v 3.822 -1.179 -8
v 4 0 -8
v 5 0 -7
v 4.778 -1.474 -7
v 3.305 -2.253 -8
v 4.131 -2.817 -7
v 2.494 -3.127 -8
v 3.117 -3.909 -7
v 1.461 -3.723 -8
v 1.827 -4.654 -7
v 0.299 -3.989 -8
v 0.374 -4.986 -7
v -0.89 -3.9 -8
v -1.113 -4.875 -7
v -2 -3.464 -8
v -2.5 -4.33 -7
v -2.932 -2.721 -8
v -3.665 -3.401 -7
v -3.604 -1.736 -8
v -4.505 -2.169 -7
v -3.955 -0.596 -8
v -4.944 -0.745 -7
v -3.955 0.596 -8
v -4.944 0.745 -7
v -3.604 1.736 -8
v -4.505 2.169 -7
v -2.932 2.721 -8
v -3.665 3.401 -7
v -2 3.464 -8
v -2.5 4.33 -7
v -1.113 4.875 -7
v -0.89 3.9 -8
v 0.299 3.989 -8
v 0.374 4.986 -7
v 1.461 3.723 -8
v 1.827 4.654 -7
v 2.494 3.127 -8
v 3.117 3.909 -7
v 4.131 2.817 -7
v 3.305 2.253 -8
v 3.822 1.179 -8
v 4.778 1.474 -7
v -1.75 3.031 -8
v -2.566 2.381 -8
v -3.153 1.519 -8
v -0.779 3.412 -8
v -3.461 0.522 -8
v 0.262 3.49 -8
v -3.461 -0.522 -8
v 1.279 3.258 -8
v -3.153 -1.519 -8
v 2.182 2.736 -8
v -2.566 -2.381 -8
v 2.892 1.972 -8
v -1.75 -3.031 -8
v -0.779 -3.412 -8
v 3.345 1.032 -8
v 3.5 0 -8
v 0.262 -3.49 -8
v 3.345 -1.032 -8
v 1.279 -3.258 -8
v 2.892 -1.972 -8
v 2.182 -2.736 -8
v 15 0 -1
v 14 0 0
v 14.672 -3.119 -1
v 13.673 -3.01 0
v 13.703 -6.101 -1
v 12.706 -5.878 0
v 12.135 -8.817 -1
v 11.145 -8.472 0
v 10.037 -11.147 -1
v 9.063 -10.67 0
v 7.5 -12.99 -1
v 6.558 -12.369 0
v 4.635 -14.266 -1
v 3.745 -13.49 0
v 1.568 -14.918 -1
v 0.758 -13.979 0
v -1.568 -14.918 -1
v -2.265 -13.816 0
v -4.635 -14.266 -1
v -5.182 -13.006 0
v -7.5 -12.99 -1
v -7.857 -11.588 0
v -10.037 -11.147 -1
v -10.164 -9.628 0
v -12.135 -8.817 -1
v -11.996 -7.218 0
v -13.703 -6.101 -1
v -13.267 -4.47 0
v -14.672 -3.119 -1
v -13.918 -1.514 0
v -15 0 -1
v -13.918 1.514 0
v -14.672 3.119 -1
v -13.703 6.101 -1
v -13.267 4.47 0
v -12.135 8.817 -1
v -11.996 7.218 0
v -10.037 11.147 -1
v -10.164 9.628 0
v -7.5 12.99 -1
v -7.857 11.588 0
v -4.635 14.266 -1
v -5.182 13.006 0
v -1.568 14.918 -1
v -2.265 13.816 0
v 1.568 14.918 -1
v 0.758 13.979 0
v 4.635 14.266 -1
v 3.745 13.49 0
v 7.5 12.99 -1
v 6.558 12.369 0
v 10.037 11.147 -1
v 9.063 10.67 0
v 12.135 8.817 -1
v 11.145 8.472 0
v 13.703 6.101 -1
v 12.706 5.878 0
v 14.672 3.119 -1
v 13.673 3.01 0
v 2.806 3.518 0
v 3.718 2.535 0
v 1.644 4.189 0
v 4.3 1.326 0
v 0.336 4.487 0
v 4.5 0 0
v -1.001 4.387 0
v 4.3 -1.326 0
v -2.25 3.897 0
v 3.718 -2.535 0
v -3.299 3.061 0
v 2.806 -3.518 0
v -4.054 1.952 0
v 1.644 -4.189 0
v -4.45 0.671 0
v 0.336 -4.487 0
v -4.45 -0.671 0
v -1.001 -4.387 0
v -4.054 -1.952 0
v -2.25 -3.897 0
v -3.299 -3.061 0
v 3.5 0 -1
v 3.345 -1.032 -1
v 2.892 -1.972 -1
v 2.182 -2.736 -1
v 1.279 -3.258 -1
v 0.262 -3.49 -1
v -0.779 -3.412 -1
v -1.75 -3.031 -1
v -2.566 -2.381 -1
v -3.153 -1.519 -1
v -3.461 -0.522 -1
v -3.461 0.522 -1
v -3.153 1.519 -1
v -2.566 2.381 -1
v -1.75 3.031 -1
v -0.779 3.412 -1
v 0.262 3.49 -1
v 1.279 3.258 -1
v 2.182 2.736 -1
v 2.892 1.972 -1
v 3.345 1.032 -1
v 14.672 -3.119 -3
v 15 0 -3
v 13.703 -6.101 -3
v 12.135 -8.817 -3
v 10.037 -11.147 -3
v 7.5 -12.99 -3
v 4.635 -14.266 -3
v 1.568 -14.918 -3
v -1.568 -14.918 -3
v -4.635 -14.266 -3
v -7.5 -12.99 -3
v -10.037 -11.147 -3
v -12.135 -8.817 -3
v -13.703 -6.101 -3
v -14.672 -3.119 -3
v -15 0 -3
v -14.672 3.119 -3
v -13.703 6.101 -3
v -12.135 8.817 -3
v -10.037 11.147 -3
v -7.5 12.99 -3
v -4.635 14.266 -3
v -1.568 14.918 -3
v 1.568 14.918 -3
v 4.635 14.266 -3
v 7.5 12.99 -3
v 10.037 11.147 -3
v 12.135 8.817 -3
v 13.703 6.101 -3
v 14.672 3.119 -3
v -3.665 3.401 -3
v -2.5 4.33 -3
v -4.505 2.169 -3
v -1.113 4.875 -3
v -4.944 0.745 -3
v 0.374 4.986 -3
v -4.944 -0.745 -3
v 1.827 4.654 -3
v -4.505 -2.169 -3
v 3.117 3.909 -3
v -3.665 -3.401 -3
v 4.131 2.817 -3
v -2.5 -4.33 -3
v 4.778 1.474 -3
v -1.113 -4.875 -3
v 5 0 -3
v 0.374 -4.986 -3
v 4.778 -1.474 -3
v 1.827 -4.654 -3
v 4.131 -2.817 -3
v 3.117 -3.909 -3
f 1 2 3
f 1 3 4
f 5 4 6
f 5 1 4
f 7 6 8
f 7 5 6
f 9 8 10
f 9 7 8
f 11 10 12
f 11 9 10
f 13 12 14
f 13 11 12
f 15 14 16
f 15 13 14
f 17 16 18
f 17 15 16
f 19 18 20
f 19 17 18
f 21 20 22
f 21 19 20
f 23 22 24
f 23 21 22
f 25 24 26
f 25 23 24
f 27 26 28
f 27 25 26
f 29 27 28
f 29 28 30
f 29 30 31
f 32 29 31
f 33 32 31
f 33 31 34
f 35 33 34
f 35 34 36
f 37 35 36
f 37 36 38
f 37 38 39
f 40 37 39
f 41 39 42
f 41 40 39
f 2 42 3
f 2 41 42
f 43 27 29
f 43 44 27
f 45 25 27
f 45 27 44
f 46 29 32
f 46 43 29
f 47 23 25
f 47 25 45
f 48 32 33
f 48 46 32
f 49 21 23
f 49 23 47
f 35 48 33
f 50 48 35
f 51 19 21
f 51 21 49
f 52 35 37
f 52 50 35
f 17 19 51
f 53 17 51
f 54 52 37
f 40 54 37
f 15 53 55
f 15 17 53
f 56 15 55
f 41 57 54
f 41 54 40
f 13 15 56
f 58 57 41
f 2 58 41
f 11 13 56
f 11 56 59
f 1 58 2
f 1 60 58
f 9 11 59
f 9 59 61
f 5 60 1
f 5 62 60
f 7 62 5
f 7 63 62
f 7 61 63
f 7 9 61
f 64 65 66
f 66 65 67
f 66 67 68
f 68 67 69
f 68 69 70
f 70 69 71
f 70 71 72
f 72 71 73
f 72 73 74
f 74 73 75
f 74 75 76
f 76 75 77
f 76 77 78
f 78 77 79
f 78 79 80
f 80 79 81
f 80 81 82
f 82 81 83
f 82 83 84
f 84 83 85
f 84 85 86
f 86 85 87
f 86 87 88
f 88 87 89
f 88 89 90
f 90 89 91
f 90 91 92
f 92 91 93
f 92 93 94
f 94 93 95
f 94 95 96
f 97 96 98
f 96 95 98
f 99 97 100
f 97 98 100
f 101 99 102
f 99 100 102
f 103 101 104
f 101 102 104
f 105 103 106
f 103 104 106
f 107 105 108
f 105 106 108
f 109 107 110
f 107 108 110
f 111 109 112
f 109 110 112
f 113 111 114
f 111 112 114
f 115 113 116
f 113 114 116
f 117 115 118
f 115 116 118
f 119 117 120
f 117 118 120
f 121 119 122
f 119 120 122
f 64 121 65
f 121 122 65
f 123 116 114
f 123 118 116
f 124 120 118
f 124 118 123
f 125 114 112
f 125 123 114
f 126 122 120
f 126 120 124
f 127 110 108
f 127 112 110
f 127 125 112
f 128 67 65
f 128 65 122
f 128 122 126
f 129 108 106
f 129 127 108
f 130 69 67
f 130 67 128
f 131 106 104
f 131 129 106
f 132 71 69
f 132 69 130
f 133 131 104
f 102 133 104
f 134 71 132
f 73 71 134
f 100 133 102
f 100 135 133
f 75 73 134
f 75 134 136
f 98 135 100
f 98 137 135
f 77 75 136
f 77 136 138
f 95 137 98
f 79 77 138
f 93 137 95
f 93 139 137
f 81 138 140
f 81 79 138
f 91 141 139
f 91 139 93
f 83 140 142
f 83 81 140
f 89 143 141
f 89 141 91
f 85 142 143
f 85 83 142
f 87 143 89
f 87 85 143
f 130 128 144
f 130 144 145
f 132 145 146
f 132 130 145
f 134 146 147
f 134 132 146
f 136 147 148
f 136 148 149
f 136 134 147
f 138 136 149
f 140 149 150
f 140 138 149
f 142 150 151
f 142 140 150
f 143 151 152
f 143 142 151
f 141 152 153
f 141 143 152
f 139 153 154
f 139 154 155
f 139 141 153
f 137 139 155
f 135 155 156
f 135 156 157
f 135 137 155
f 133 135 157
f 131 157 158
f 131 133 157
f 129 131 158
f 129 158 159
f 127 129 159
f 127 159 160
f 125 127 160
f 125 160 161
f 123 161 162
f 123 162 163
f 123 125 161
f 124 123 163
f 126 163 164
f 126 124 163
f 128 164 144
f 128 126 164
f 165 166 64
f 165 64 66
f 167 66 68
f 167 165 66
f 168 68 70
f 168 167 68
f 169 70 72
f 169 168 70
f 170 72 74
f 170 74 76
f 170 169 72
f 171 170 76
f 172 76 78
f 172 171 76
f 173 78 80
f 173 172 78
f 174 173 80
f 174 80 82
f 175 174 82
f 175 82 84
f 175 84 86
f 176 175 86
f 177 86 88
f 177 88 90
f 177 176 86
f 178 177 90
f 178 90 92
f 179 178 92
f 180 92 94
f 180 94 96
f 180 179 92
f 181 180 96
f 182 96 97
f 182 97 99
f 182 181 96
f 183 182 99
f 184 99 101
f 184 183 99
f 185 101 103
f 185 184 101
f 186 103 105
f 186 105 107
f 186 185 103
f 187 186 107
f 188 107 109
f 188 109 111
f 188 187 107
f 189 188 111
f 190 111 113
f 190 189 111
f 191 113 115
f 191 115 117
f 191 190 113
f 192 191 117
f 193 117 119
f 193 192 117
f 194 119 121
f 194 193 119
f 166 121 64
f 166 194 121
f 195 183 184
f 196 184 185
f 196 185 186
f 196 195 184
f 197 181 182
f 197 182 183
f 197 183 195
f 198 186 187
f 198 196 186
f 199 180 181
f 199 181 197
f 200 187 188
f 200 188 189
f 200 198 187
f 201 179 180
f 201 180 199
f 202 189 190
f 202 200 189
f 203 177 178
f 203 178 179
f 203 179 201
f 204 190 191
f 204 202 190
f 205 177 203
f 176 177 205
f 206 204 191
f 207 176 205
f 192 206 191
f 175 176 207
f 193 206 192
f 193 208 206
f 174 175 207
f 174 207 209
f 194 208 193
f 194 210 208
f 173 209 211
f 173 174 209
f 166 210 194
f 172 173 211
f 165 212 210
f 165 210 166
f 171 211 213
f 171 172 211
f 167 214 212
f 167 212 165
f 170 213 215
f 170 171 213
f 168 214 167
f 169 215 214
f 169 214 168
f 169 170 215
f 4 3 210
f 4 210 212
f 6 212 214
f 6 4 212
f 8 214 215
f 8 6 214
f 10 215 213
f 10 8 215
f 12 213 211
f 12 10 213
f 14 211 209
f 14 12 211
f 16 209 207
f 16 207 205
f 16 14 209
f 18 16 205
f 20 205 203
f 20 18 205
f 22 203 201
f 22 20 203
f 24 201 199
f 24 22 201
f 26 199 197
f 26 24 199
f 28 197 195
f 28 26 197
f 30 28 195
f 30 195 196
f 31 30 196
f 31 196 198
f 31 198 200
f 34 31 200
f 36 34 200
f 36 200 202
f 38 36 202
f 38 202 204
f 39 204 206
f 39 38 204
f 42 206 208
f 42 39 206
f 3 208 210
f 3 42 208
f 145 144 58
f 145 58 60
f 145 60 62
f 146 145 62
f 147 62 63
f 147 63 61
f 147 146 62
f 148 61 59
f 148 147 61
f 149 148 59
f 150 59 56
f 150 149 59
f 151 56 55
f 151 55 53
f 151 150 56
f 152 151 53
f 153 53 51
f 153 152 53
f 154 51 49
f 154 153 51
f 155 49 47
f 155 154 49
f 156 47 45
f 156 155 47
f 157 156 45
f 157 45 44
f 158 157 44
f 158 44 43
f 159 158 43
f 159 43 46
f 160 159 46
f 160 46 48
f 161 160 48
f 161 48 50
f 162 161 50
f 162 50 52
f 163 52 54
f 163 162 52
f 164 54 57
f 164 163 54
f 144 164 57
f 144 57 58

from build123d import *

# Parameters (mm, degrees)
CHAMFER1_SIZE = 1
CHAMFER2_SIZE = 1


with BuildPart() as part:
    # Sketch1 → Revolve1 (revolve)
    with BuildSketch(Plane.ZY, mode=Mode.PRIVATE) as revolve1_sk:
        Polygon((-8, 3.5), (0, 3.5), (0, 15), (-3, 15), (-3, 5), (-8, 5), align=None)
    revolve(revolve1_sk.sketch.rotate(Axis((0, 0, 0), (0, 0, -1)), 90), axis=Axis((0, 0, 0), (0, 0, -1)))

    # Chamfer1
    chamfer1_edges = [part.edges().sort_by_distance(p)[0] for p in [
        (-5, 0, -8),
    ]]
    chamfer(chamfer1_edges, length=CHAMFER1_SIZE)

    # Chamfer2
    chamfer2_edges = [part.edges().sort_by_distance(p)[0] for p in [
        (-15, 0, 0),
        (-3.5, 0, 0),
    ]]
    chamfer(chamfer2_edges, length=CHAMFER2_SIZE)


solid = part.part
